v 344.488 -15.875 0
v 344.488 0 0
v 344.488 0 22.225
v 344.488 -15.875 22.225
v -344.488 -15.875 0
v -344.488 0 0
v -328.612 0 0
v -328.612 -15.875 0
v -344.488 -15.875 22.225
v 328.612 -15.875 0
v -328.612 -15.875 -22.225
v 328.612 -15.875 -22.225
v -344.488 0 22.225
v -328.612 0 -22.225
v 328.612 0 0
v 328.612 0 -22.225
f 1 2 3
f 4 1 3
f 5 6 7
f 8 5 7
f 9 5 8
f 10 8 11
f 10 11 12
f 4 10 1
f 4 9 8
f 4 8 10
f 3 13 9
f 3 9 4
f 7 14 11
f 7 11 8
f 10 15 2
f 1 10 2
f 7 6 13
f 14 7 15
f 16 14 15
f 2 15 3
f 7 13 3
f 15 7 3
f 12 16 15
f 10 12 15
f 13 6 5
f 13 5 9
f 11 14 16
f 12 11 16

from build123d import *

# Parameters (mm, degrees)
F0_W     = 688.975
F0_H     = 44.45
F1_DEPTH = 15.875
F2_W     = 15.875
F2_H     = 22.225
F3_DEPTH = 15.876


with BuildPart() as f1:
    # F0 (on Front) → F1 (new body)
    with BuildSketch(Plane.XZ):
        Rectangle(F0_W, F0_H)
    extrude(amount=F1_DEPTH)

    # F2 (on face) → F3 (cut, through all)
    with BuildSketch(Plane.XZ):
        with Locations((-336.55, -11.1125)):
            Rectangle(F2_W, F2_H)
        with Locations((336.55, -11.1125)):
            Rectangle(F2_W, F2_H)
    extrude(amount=F3_DEPTH, mode=Mode.SUBTRACT)


solid = f1.part
